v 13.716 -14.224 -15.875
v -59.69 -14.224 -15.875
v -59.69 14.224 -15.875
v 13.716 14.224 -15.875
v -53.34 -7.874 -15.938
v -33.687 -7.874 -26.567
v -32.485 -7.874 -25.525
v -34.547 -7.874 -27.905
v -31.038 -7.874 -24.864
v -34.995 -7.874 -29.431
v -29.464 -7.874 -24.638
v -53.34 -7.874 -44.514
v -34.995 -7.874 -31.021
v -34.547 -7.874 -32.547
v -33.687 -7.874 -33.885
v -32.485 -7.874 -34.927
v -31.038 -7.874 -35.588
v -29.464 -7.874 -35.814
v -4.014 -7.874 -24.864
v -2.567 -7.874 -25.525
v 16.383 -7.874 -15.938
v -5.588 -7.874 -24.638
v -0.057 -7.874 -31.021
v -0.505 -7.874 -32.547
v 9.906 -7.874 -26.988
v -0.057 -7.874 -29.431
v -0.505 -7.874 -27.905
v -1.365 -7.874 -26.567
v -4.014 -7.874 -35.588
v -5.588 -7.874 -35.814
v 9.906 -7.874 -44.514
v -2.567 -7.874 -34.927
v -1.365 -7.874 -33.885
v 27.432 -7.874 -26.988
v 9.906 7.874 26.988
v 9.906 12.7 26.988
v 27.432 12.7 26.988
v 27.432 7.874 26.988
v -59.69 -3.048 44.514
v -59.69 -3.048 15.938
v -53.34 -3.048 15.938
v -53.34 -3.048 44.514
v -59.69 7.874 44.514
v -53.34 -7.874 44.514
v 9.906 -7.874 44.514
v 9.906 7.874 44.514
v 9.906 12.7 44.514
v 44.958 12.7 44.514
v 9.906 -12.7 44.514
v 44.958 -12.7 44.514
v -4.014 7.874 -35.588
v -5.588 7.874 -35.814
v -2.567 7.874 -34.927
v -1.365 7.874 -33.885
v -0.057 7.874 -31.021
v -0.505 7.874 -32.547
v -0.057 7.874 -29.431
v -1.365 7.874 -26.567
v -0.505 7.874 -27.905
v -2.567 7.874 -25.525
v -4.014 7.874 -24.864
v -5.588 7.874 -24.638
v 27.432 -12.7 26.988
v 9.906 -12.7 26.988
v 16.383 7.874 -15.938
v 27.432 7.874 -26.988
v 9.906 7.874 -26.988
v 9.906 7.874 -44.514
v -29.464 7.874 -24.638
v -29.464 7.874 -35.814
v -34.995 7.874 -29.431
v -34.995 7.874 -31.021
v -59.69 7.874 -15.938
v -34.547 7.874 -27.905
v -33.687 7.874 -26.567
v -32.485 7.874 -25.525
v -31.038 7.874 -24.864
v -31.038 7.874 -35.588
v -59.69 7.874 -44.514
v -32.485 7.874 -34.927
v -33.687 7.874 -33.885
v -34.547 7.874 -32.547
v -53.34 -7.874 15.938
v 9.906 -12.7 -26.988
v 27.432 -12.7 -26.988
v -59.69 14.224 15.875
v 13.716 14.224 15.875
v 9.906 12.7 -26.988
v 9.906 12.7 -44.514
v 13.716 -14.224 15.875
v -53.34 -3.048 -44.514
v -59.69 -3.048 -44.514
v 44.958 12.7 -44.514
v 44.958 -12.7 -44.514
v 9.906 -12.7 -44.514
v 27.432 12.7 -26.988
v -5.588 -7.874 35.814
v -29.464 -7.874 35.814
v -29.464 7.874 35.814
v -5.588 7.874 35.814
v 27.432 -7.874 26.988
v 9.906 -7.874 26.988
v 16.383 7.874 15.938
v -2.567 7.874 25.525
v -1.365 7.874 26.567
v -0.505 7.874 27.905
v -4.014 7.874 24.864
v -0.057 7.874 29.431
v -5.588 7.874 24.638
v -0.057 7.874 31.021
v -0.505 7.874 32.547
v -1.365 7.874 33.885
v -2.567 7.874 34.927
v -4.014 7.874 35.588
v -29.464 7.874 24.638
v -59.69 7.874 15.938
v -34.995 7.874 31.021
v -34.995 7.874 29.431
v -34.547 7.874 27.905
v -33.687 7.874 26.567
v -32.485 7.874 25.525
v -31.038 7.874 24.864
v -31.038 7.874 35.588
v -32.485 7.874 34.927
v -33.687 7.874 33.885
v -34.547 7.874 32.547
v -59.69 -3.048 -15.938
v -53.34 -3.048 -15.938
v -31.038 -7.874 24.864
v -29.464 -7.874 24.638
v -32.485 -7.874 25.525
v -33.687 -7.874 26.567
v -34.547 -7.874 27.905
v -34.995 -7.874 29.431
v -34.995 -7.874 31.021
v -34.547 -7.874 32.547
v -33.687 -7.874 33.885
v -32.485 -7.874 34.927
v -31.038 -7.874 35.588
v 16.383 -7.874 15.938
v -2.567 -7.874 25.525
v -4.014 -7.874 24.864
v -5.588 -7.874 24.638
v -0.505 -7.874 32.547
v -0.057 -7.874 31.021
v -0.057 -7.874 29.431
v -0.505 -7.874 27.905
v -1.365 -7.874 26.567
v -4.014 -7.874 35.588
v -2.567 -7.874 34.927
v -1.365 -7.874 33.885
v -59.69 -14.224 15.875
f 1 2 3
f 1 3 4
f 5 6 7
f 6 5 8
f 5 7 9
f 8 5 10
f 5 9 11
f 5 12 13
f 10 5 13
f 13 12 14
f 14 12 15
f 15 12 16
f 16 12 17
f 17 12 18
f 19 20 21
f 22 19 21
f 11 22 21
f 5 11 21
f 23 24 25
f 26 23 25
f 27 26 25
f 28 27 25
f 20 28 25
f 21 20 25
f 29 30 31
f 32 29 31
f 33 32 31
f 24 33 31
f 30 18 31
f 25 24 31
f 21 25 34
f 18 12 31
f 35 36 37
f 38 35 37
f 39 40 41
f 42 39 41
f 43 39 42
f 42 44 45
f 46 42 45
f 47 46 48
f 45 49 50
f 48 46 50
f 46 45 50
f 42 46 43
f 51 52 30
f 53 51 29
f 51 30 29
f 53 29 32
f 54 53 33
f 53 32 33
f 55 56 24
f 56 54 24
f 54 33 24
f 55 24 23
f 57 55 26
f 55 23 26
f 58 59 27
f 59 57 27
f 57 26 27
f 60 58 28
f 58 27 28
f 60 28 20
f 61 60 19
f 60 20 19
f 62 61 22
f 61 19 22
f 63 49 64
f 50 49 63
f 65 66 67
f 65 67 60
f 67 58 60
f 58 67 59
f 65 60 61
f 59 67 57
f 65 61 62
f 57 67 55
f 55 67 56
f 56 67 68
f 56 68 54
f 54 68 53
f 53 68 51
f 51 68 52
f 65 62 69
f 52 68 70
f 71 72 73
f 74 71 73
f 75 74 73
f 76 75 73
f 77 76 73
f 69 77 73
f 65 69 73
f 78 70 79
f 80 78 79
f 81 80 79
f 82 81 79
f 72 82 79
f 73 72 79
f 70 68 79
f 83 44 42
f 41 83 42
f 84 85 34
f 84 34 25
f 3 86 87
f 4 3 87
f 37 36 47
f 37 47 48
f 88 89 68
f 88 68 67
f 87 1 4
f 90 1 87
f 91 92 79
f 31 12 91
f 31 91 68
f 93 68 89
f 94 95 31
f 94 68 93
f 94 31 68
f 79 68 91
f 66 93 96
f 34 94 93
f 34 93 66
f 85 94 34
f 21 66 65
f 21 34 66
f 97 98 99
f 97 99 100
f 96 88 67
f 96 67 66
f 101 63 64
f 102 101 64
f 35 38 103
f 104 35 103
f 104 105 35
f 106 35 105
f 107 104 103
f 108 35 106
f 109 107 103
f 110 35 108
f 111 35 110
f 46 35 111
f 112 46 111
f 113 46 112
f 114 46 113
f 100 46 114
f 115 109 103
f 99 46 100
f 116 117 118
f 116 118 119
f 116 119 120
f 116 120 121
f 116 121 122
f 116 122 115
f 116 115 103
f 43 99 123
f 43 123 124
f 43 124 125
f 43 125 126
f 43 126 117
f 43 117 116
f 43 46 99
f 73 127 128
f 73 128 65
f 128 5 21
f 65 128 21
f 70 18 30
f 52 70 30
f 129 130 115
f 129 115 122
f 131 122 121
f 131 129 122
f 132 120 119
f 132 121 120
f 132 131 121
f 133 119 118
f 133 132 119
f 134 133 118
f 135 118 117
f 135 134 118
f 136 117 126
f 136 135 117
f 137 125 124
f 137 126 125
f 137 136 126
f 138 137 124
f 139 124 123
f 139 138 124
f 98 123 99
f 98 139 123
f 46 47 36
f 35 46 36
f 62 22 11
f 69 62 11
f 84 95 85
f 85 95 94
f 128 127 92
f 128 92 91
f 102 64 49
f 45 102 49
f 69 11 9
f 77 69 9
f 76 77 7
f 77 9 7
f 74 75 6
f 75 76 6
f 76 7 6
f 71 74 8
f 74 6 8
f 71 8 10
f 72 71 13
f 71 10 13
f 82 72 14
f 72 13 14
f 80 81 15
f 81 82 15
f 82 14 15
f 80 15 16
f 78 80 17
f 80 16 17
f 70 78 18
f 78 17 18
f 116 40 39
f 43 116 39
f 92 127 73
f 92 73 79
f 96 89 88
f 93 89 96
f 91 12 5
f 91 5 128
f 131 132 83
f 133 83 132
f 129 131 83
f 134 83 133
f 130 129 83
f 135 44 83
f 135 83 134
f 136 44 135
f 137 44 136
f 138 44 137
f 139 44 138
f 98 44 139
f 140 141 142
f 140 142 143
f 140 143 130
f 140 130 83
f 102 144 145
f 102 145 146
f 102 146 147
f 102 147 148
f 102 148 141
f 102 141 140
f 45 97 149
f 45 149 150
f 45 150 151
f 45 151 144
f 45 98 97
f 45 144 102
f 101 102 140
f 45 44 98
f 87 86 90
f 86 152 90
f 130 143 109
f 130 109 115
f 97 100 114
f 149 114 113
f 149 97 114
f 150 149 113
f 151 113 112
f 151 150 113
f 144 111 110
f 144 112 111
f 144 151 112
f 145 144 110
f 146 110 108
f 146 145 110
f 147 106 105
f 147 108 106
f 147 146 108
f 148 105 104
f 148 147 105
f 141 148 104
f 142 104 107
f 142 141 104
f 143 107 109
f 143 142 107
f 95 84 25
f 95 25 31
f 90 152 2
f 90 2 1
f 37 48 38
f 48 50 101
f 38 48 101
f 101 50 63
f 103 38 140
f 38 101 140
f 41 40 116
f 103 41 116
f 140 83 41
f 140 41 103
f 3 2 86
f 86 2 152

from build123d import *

# Parameters (mm, degrees)
F0_W      = 104.648
F0_H      = 28.575
F1_DEPTH  = 12.7
F2_W      = 6.35
F2_H      = 9.652
F3_DEPTH  = 28.576
F5_DEPTH  = 4.826
F7_DEPTH  = 4.826
F9_DEPTH  = 25.401
F10_W     = 73.406
F10_H     = 31.75
F11_DEPTH = 14.224


with BuildPart() as f1:
    # F0 (on Front) → F1 (new body, symmetric)
    with BuildSketch(Plane.XZ):
        with Locations((-7.366, 30.226)):
            Rectangle(F0_W, F0_H)
        with BuildLine():
            ThreePointArc((-29.464, 24.638), (-35.052, 30.226), (-29.464, 35.814))
            Line((-29.464, 35.814), (-5.588, 35.814))
            ThreePointArc((-5.588, 35.814), (0, 30.226), (-5.588, 24.638))
            Line((-5.588, 24.638), (-29.464, 24.638))
        make_face(mode=Mode.SUBTRACT)
    extrude(amount=F1_DEPTH, both=True)

    # F2 (on face) → F3 (cut, through all)
    with BuildSketch(Plane.XY.offset(44.5135)):
        with Locations((-56.515, -7.874)):
            Rectangle(F2_W, F2_H)
    extrude(amount=-F3_DEPTH, mode=Mode.SUBTRACT)

    # F4 (on face) → F5 (cut)
    with BuildSketch(Plane.XZ.offset(12.7)):
        Polygon((9.906, 44.5135), (-53.34, 44.5135), (-53.34, 15.9385), (44.958, 15.9385), (44.958, 26.9875), (9.906, 26.9875), align=None)
        with BuildLine():
            Line((-5.588, 24.638), (-29.464, 24.638))
            ThreePointArc((-29.464, 24.638), (-35.052, 30.226), (-29.464, 35.814))
            Line((-29.464, 35.814), (-5.588, 35.814))
            ThreePointArc((-5.588, 35.814), (0, 30.226), (-5.588, 24.638))
        make_face(mode=Mode.SUBTRACT)
    extrude(amount=-F5_DEPTH, mode=Mode.SUBTRACT)

    # F6 (on face) → F7 (cut)
    with BuildSketch(Plane(origin=(0, 12.7, 0), x_dir=(-1, 0, 0), z_dir=(0, 1, 0))):
        Polygon((59.69, 15.9385), (59.69, 44.5135), (-9.906, 44.5135), (-9.906, 26.9875), (-44.958, 26.9875), (-44.958, 15.9385), align=None)
        with BuildLine():
            Line((5.588, 35.814), (29.464, 35.814))
            ThreePointArc((29.464, 35.814), (35.052, 30.226), (29.464, 24.638))
            Line((29.464, 24.638), (5.588, 24.638))
            ThreePointArc((5.588, 24.638), (0, 30.226), (5.588, 35.814))
        make_face(mode=Mode.SUBTRACT)
    extrude(amount=-F7_DEPTH, mode=Mode.SUBTRACT)

    # F8 (on face) → F9 (cut, through all)
    with BuildSketch(Plane.XZ.offset(12.7)):
        Polygon((44.958, 26.9875), (44.958, 44.5135), (27.432, 26.9875), align=None)
        Polygon((44.958, 26.9875), (27.432, 26.9875), (16.383, 15.9385), (44.958, 15.9385), align=None)
    extrude(amount=-F9_DEPTH, mode=Mode.SUBTRACT)


with BuildPart() as f11:
    # F10 (on Front) → F11 (new body, symmetric)
    with BuildSketch(Plane.XZ):
        with Locations((-22.987, 0)):
            Rectangle(F10_W, F10_H)
    extrude(amount=F11_DEPTH, both=True)


with BuildPart() as f12_1:
    # F12: instance of F1
    add(f1.part.mirror(Plane.XY))


solid = Compound([f1.part, f11.part, f12_1.part])
